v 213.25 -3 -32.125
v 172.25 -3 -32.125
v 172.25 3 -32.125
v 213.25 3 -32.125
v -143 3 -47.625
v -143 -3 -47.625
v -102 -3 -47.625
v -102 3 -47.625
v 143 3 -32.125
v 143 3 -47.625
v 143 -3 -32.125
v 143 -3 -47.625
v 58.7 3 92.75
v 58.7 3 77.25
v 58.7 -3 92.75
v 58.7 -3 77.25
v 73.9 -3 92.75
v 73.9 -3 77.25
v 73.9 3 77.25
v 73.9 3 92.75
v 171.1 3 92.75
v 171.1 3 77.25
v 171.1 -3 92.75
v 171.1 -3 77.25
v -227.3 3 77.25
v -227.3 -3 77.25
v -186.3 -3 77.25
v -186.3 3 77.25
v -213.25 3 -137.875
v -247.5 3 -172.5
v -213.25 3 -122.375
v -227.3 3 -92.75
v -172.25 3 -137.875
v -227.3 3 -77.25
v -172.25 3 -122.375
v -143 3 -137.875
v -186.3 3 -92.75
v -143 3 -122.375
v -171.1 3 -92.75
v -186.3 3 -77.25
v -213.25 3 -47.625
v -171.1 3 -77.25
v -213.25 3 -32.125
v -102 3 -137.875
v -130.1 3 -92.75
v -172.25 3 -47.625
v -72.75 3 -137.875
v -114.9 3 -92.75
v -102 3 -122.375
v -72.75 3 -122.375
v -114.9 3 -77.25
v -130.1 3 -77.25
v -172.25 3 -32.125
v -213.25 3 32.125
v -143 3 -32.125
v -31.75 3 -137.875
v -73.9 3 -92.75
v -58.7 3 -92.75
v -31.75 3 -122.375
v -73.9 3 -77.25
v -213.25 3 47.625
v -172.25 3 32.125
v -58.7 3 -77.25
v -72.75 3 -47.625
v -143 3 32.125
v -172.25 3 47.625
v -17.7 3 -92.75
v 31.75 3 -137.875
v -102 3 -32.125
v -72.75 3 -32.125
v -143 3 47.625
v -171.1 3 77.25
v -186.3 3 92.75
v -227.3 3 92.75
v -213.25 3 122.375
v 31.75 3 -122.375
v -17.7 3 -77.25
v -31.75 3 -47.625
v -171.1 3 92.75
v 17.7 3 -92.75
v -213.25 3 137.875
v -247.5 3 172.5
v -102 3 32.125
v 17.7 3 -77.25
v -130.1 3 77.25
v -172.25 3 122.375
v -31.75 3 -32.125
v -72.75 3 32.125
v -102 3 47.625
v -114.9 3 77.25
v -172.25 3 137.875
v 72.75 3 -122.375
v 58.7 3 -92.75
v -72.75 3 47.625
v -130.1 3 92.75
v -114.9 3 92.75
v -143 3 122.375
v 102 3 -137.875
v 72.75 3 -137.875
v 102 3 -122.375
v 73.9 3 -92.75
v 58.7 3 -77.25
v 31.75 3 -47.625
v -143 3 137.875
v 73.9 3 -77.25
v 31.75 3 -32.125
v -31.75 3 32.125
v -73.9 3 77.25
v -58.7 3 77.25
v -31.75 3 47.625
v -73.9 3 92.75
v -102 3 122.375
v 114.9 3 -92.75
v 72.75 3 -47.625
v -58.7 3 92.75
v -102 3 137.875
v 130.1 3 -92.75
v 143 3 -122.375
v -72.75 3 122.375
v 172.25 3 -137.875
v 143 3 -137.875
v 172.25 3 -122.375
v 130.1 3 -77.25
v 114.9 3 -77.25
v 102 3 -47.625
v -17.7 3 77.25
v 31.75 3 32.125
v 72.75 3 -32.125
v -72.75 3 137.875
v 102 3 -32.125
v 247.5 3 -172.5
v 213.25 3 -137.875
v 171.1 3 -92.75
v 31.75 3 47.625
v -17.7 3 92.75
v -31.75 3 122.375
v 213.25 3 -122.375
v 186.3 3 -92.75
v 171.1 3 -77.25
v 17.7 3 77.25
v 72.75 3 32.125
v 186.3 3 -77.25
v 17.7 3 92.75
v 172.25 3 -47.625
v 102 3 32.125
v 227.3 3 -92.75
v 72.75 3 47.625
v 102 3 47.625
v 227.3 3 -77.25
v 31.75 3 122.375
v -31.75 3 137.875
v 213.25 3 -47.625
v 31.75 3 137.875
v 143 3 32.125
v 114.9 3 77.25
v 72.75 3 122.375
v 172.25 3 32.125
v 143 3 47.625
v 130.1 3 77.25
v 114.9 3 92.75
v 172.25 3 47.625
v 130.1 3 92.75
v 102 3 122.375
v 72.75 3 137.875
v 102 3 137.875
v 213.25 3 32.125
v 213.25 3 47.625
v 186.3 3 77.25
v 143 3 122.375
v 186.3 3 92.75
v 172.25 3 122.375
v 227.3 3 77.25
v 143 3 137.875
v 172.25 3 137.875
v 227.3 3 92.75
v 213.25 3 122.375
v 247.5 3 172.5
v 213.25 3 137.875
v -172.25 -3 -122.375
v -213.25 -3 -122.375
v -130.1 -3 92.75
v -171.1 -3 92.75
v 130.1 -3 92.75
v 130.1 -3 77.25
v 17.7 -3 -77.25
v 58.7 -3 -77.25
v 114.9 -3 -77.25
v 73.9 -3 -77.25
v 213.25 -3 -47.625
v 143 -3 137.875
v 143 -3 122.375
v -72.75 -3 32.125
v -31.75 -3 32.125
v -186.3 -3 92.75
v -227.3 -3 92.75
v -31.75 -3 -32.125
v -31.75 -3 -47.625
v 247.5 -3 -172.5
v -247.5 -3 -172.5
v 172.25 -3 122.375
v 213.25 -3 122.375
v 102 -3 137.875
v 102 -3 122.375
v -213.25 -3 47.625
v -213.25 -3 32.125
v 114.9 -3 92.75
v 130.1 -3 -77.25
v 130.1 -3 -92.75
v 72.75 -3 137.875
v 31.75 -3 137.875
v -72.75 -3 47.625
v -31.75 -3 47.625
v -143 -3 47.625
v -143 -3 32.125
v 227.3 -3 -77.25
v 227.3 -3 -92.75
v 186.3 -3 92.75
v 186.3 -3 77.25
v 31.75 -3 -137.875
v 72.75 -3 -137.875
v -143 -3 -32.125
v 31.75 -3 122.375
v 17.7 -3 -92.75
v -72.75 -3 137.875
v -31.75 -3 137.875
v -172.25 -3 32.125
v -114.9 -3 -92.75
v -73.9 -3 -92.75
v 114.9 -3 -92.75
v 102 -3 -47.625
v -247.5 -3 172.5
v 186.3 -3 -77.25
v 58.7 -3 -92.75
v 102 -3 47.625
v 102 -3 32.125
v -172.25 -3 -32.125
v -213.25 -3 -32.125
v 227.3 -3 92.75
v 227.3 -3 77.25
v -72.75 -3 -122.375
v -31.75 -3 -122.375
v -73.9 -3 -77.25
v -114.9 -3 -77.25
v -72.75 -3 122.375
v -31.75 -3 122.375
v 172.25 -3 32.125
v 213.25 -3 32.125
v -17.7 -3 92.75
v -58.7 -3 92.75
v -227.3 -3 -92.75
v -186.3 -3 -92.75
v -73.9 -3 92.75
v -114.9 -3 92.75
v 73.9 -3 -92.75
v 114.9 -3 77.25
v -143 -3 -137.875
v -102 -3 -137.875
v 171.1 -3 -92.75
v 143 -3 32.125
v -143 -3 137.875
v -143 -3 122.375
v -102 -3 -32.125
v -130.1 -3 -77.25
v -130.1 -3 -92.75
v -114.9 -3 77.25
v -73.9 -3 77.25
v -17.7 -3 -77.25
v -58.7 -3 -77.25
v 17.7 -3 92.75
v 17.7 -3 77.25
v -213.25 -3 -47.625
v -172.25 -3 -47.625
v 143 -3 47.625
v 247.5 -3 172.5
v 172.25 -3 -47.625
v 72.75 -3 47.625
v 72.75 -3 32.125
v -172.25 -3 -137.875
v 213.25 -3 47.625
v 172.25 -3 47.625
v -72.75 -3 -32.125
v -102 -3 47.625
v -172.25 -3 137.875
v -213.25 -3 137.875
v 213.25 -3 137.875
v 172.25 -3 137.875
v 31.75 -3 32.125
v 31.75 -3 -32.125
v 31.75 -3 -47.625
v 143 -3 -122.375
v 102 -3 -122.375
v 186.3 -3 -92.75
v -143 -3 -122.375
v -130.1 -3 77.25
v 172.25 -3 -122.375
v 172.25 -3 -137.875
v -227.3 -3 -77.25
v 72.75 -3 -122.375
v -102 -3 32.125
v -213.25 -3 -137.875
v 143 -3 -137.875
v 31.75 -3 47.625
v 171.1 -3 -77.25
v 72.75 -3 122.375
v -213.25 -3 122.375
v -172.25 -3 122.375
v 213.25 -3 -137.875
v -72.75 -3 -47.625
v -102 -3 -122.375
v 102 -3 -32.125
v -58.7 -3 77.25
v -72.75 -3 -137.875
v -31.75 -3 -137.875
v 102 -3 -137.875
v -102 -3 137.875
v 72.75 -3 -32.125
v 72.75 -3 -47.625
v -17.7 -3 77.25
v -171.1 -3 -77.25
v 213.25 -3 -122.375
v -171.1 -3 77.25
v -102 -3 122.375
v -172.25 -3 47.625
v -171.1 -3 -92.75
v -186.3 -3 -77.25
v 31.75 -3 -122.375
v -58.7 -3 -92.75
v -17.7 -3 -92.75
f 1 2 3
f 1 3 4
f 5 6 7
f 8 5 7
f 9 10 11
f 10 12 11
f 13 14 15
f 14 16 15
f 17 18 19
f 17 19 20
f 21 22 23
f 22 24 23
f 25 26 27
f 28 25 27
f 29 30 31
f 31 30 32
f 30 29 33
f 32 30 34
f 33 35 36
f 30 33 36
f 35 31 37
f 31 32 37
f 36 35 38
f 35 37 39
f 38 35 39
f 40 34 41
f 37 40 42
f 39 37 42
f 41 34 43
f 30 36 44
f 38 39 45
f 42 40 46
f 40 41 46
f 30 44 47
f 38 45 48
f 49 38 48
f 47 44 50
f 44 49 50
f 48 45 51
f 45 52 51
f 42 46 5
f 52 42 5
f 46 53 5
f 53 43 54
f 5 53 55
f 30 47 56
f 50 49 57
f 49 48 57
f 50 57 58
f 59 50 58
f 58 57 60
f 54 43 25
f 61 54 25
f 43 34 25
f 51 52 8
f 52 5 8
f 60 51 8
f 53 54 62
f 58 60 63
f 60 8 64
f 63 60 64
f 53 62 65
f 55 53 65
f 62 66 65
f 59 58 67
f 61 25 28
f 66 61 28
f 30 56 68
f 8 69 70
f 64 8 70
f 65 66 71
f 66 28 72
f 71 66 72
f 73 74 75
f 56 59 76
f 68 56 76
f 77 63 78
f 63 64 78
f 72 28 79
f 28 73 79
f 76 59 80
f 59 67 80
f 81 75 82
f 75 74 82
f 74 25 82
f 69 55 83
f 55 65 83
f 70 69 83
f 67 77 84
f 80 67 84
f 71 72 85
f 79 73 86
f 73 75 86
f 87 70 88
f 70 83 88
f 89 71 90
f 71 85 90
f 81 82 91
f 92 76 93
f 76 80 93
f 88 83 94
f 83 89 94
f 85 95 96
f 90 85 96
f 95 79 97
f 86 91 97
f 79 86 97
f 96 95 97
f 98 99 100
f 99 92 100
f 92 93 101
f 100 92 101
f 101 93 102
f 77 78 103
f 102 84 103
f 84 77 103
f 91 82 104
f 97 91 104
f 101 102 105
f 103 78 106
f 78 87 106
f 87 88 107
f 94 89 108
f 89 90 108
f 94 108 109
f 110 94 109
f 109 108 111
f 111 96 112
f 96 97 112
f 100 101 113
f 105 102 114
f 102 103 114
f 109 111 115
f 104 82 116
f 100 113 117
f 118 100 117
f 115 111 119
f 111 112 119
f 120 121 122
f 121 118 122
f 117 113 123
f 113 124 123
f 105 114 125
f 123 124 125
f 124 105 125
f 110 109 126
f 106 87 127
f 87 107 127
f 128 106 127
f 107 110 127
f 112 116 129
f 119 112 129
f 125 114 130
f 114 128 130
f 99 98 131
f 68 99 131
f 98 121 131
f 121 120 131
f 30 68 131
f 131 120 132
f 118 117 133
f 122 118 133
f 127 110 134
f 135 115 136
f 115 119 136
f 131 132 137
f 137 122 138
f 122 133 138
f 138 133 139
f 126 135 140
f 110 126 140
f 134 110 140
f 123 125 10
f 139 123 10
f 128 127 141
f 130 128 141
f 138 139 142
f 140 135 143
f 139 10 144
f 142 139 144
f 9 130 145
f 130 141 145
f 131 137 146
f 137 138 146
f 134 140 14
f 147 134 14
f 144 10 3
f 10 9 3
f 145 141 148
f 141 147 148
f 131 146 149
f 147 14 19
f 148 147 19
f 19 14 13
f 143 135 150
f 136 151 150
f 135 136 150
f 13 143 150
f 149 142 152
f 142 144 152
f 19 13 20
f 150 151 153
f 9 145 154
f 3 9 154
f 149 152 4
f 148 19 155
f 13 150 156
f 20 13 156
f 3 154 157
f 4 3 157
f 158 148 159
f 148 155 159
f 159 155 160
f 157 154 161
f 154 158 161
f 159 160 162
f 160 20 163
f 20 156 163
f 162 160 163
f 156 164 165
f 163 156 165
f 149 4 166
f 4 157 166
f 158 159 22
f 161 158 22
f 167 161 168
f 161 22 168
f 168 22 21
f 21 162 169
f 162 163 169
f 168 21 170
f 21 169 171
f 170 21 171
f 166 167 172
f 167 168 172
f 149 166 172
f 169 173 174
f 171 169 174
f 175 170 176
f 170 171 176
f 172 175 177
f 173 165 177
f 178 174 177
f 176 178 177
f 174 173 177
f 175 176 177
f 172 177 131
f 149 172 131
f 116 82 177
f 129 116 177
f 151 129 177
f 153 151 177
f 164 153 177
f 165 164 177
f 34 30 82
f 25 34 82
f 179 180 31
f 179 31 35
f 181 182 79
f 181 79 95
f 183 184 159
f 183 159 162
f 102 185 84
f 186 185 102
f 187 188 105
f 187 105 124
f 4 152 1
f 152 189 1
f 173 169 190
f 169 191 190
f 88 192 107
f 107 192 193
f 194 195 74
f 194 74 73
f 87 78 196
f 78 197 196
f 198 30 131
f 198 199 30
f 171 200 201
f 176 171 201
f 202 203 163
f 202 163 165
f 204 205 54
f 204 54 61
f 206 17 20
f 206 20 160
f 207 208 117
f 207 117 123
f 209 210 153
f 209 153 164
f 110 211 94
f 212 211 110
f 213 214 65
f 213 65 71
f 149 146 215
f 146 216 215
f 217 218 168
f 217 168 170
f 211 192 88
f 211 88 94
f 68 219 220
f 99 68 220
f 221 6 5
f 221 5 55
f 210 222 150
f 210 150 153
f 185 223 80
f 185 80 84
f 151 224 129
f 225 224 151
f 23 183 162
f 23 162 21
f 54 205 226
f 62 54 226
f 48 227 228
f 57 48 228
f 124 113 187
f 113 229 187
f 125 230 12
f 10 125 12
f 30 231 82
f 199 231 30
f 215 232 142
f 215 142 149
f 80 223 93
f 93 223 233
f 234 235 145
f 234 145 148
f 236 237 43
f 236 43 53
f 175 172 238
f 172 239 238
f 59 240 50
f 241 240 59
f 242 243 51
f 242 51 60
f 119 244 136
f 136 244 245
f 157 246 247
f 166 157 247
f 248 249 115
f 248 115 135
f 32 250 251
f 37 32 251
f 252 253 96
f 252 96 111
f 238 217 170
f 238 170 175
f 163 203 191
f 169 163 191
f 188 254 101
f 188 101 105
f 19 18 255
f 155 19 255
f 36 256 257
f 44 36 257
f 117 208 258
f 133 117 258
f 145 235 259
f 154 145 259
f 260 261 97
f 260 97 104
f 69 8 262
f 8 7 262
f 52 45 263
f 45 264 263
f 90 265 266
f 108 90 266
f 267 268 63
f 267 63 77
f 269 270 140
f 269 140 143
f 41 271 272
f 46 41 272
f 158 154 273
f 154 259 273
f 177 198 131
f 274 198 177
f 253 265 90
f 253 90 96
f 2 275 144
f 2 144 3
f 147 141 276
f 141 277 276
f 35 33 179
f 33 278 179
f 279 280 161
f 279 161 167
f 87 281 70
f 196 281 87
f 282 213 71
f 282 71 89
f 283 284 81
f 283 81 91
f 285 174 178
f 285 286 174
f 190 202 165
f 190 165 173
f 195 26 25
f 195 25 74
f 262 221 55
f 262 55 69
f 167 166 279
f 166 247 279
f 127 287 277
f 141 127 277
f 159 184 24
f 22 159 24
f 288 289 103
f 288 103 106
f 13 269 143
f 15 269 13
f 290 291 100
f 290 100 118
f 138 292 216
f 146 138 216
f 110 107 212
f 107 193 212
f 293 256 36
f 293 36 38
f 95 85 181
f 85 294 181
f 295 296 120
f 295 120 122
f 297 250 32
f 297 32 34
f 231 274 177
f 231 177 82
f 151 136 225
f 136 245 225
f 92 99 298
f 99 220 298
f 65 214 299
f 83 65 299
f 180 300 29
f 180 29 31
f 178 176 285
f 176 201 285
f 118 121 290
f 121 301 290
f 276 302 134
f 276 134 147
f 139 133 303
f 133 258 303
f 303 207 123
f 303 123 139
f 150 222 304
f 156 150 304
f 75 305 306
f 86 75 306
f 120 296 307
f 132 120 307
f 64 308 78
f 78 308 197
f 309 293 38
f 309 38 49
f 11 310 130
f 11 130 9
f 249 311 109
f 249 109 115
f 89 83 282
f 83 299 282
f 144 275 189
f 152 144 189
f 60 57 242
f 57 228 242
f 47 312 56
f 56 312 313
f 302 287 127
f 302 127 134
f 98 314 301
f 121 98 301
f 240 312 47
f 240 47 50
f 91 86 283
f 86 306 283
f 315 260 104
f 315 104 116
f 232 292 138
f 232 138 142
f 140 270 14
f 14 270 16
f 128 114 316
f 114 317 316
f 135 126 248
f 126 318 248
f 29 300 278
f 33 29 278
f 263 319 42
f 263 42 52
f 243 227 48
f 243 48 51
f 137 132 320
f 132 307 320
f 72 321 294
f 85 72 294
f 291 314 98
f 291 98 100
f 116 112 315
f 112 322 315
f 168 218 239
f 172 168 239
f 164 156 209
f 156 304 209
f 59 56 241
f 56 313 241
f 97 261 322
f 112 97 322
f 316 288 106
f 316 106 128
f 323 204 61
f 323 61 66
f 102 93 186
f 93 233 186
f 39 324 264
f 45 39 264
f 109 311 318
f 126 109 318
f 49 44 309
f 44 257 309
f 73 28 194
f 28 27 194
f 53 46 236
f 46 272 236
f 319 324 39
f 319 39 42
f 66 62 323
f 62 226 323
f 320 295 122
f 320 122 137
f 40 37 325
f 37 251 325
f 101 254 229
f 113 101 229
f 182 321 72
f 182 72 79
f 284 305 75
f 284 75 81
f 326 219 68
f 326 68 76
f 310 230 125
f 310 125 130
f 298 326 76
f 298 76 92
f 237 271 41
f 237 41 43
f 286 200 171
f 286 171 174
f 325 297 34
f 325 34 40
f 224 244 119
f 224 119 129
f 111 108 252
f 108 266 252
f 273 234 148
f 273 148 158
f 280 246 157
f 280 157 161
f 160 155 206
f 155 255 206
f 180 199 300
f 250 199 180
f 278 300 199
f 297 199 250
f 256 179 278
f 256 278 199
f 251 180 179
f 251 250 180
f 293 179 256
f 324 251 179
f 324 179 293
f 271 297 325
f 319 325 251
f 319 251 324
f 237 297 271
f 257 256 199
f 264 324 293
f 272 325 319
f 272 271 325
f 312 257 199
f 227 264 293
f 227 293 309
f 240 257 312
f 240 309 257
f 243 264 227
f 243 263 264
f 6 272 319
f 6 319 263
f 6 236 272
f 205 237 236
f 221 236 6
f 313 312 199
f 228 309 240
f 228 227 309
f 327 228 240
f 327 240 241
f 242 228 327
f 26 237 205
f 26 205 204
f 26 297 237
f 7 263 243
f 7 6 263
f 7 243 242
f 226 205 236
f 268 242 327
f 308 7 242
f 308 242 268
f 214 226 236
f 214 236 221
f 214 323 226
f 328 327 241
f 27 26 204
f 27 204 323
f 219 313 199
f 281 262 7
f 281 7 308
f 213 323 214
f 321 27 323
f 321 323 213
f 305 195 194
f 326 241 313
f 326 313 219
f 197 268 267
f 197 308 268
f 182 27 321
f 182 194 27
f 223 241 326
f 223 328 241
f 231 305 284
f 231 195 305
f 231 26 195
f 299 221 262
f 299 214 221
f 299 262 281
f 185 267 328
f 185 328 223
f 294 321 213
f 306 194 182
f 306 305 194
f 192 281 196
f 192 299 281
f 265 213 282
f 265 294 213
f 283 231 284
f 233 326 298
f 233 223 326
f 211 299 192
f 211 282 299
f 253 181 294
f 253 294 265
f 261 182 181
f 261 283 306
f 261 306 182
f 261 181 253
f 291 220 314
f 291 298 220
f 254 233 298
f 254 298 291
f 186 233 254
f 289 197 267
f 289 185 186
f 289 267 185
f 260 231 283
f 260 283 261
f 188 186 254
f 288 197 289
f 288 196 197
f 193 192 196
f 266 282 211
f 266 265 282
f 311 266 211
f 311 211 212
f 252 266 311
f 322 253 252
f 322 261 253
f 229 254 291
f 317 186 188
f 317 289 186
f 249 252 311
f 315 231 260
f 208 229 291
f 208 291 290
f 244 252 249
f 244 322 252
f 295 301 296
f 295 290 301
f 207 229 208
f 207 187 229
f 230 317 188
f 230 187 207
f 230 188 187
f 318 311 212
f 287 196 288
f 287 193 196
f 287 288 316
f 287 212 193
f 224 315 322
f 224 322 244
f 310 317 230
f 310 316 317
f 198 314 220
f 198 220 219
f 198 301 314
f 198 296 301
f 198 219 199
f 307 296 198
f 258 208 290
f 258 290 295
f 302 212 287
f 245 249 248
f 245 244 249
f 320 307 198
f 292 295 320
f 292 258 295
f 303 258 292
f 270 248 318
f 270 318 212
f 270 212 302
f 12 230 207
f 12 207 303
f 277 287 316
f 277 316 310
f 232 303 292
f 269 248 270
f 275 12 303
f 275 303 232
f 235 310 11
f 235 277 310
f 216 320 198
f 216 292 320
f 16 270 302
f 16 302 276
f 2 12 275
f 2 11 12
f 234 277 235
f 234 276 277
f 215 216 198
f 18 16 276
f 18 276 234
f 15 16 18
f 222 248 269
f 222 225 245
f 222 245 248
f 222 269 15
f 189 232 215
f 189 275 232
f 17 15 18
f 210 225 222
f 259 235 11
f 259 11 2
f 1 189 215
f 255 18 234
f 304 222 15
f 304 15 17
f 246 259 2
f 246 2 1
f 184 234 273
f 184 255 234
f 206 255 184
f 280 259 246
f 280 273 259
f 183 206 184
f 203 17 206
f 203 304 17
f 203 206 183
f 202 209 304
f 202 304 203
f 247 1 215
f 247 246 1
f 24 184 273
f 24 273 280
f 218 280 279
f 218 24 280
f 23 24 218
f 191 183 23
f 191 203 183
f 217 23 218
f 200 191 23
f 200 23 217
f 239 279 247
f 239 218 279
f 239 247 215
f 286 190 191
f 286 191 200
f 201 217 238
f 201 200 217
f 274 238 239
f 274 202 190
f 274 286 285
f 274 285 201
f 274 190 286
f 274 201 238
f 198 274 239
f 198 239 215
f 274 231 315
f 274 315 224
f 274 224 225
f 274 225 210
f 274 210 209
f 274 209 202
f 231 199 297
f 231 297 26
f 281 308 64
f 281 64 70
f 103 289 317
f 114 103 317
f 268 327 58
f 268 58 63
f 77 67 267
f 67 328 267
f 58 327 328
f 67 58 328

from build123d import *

# Parameters (mm, degrees)
F0_W     = 41
F0_H     = 15.5
F1_DEPTH = 3


with BuildPart() as f1:
    # F0 (on Front) → F1 (new body, symmetric)
    with BuildSketch(Plane.XZ):
        Polygon((-227.5, -172.5), (227.5, -172.5), (247.5, -172.5), (247.5, -152.5), (247.5, 152.5), (247.5, 172.5), (226.916667, 172.5), (-228.083333, 172.5), (-247.5, 172.5), (-247.5, 152.5), (-247.5, -152.5), (-247.5, -172.5), align=None)
        with Locations((-192.75, -130.125)):
            Rectangle(F0_W, F0_H, mode=Mode.SUBTRACT)
        with Locations((-122.5, -130.125)):
            Rectangle(F0_W, F0_H, mode=Mode.SUBTRACT)
        with Locations((-52.25, -130.125)):
            Rectangle(F0_W, F0_H, mode=Mode.SUBTRACT)
        with Locations((-206.8, -85)):
            Rectangle(F0_W, F0_H, mode=Mode.SUBTRACT)
        with Locations((-150.6, -85)):
            Rectangle(F0_W, F0_H, mode=Mode.SUBTRACT)
        with Locations((-192.75, -39.875)):
            Rectangle(F0_W, F0_H, mode=Mode.SUBTRACT)
        with Locations((-94.4, -85)):
            Rectangle(F0_W, F0_H, mode=Mode.SUBTRACT)
        with Locations((-38.2, -85)):
            Rectangle(F0_W, F0_H, mode=Mode.SUBTRACT)
        with Locations((-122.5, -39.875)):
            Rectangle(F0_W, F0_H, mode=Mode.SUBTRACT)
        with Locations((-52.25, -39.875)):
            Rectangle(F0_W, F0_H, mode=Mode.SUBTRACT)
        with Locations((52.25, -130.125)):
            Rectangle(F0_W, F0_H, mode=Mode.SUBTRACT)
        with Locations((122.5, -130.125)):
            Rectangle(F0_W, F0_H, mode=Mode.SUBTRACT)
        with Locations((192.75, -130.125)):
            Rectangle(F0_W, F0_H, mode=Mode.SUBTRACT)
        with Locations((38.2, -85)):
            Rectangle(F0_W, F0_H, mode=Mode.SUBTRACT)
        with Locations((94.4, -85)):
            Rectangle(F0_W, F0_H, mode=Mode.SUBTRACT)
        with Locations((52.25, -39.875)):
            Rectangle(F0_W, F0_H, mode=Mode.SUBTRACT)
        with Locations((122.5, -39.875)):
            Rectangle(F0_W, F0_H, mode=Mode.SUBTRACT)
        with Locations((150.6, -85)):
            Rectangle(F0_W, F0_H, mode=Mode.SUBTRACT)
        with Locations((206.8, -85)):
            Rectangle(F0_W, F0_H, mode=Mode.SUBTRACT)
        with Locations((192.75, -39.875)):
            Rectangle(F0_W, F0_H, mode=Mode.SUBTRACT)
        with Locations((-192.75, 39.875)):
            Rectangle(F0_W, F0_H, mode=Mode.SUBTRACT)
        with Locations((-206.8, 85)):
            Rectangle(F0_W, F0_H, mode=Mode.SUBTRACT)
        with Locations((-150.6, 85)):
            Rectangle(F0_W, F0_H, mode=Mode.SUBTRACT)
        with Locations((-122.5, 39.875)):
            Rectangle(F0_W, F0_H, mode=Mode.SUBTRACT)
        with Locations((-52.25, 39.875)):
            Rectangle(F0_W, F0_H, mode=Mode.SUBTRACT)
        with Locations((-94.4, 85)):
            Rectangle(F0_W, F0_H, mode=Mode.SUBTRACT)
        with Locations((-38.2, 85)):
            Rectangle(F0_W, F0_H, mode=Mode.SUBTRACT)
        with Locations((-192.75, 130.125)):
            Rectangle(F0_W, F0_H, mode=Mode.SUBTRACT)
        with Locations((-122.5, 130.125)):
            Rectangle(F0_W, F0_H, mode=Mode.SUBTRACT)
        with Locations((-52.25, 130.125)):
            Rectangle(F0_W, F0_H, mode=Mode.SUBTRACT)
        with Locations((52.25, 39.875)):
            Rectangle(F0_W, F0_H, mode=Mode.SUBTRACT)
        with Locations((122.5, 39.875)):
            Rectangle(F0_W, F0_H, mode=Mode.SUBTRACT)
        with Locations((38.2, 85)):
            Rectangle(F0_W, F0_H, mode=Mode.SUBTRACT)
        with Locations((94.4, 85)):
            Rectangle(F0_W, F0_H, mode=Mode.SUBTRACT)
        with Locations((192.75, 39.875)):
            Rectangle(F0_W, F0_H, mode=Mode.SUBTRACT)
        with Locations((150.6, 85)):
            Rectangle(F0_W, F0_H, mode=Mode.SUBTRACT)
        with Locations((206.8, 85)):
            Rectangle(F0_W, F0_H, mode=Mode.SUBTRACT)
        with Locations((52.25, 130.125)):
            Rectangle(F0_W, F0_H, mode=Mode.SUBTRACT)
        with Locations((122.5, 130.125)):
            Rectangle(F0_W, F0_H, mode=Mode.SUBTRACT)
        with Locations((192.75, 130.125)):
            Rectangle(F0_W, F0_H, mode=Mode.SUBTRACT)
    extrude(amount=F1_DEPTH, both=True)


solid = f1.part
